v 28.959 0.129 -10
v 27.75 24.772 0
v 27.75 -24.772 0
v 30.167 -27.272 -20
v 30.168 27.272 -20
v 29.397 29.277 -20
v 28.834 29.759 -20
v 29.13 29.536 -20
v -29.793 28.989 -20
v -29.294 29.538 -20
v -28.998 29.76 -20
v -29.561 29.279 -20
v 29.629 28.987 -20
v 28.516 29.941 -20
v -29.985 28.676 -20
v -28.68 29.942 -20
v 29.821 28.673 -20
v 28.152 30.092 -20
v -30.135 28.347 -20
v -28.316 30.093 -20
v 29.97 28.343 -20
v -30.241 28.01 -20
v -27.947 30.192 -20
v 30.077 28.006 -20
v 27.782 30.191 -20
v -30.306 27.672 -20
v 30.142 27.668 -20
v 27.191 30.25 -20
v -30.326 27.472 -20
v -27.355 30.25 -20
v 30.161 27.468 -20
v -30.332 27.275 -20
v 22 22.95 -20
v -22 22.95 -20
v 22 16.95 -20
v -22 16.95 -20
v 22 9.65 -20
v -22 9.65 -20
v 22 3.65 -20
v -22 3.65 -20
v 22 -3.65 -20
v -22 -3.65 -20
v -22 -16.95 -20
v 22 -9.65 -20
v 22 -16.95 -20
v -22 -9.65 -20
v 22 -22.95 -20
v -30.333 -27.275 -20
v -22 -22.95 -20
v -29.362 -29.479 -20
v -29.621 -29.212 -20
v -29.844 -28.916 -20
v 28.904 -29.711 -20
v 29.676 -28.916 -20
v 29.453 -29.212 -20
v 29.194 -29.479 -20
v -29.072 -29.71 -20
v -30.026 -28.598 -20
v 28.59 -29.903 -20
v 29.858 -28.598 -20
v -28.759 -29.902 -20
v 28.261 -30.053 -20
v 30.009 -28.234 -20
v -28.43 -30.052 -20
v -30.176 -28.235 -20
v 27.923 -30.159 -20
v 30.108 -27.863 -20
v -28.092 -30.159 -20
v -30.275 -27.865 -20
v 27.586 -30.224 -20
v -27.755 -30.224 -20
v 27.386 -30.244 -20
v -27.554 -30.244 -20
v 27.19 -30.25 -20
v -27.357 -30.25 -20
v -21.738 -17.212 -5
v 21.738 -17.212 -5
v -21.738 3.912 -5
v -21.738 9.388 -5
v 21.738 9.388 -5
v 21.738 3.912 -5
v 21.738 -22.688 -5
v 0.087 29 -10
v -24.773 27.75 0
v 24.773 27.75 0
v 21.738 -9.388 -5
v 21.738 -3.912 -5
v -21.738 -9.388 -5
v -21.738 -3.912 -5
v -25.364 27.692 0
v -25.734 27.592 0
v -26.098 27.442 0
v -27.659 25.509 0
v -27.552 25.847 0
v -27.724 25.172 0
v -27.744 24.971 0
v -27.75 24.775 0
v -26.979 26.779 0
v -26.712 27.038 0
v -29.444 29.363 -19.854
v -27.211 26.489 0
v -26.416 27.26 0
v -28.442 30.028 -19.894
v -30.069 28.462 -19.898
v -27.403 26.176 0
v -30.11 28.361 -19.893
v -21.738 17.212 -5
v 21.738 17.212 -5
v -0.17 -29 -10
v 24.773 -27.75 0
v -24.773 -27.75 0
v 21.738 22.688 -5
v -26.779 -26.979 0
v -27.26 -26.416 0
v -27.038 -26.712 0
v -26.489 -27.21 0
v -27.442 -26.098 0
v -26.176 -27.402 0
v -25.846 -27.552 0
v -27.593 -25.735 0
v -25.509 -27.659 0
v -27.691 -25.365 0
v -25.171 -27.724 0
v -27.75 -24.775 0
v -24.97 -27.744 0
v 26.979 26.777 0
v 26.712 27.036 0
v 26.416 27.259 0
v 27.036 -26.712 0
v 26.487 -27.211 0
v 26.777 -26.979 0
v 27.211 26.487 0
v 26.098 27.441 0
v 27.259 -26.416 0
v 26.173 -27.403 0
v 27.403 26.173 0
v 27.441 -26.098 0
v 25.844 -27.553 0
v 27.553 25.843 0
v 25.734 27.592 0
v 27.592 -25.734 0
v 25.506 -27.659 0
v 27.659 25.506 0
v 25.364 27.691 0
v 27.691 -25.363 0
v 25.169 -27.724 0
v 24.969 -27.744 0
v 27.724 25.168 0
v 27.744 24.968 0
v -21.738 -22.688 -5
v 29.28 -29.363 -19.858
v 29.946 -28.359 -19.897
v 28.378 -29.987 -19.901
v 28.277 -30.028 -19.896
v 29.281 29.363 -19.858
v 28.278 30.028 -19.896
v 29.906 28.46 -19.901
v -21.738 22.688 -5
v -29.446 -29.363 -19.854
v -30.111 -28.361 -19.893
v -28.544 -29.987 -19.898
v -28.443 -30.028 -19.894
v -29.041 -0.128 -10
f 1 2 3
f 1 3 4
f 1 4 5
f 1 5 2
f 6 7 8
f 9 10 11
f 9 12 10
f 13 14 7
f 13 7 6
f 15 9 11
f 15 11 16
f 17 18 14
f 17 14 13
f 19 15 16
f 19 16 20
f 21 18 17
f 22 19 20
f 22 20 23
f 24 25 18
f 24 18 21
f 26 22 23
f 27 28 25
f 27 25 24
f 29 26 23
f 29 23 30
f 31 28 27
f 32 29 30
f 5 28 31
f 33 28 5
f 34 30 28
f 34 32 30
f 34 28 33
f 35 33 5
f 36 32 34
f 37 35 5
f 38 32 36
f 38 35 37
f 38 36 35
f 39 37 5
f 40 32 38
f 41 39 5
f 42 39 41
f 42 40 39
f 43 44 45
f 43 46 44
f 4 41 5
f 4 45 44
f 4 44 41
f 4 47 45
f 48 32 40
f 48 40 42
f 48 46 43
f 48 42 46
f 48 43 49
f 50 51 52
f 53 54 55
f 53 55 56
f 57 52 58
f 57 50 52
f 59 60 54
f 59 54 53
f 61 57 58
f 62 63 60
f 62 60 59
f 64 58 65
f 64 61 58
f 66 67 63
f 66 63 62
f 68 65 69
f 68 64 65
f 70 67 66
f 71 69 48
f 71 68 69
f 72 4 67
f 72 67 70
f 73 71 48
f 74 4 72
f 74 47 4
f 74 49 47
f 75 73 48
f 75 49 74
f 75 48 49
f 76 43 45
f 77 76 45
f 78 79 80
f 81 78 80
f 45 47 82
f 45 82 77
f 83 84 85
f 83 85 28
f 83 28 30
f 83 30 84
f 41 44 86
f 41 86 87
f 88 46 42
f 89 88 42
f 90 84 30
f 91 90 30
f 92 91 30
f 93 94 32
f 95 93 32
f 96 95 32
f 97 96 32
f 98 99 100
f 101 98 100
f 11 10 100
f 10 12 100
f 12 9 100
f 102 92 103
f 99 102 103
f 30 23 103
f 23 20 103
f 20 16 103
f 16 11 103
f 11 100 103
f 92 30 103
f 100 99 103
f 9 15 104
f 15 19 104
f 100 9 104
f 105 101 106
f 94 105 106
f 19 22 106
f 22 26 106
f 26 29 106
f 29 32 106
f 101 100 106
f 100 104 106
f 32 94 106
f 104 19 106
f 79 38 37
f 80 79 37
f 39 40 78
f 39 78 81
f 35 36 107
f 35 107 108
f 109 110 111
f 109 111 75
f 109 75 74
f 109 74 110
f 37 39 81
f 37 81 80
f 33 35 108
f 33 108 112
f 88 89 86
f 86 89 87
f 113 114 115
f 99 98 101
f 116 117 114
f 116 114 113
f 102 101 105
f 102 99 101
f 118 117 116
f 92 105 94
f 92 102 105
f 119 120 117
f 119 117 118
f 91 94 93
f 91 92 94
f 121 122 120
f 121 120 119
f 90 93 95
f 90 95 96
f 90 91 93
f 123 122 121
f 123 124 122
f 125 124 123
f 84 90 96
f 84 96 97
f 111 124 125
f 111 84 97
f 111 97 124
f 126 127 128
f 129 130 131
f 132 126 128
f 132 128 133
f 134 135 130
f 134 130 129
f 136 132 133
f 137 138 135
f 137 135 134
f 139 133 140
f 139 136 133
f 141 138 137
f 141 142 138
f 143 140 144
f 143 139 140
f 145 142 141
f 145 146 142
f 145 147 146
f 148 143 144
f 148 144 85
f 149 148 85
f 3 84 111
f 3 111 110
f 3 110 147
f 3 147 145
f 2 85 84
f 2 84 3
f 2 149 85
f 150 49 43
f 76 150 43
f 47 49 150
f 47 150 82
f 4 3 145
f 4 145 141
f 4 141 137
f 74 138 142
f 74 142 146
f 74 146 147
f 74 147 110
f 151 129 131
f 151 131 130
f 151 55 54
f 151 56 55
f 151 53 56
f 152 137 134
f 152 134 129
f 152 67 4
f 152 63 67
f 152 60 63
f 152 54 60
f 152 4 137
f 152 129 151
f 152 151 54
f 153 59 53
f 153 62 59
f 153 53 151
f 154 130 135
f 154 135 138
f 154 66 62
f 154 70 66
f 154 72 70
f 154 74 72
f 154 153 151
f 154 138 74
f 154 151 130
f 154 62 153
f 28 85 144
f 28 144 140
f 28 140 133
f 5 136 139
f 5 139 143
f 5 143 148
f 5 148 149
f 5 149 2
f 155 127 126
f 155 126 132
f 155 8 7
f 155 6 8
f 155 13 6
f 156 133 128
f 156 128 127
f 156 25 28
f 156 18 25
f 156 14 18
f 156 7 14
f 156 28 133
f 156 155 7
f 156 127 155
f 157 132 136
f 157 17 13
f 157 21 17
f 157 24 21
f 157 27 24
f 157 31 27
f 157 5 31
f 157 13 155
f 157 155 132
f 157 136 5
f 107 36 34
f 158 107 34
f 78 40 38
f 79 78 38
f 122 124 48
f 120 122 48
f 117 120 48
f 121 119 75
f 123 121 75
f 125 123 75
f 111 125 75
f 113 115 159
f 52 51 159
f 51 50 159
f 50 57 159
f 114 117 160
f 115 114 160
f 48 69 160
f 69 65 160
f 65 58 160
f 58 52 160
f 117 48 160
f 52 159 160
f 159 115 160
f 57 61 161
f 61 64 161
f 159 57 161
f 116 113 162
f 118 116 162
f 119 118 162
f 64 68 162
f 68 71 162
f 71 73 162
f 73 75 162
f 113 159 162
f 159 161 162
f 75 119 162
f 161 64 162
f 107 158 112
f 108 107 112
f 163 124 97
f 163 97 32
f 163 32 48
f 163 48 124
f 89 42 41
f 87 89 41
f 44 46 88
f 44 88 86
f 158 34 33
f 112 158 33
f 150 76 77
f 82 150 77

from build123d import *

# Parameters (mm, degrees)
ESQUISSE3_W                       = 44
ESQUISSE3_H                       = 6
ENL_V_MAT_EXTRU_3_DEPTH           = 15
ENL_V_MAT_EXTRU_3_DRAFT           = 1
ENL_V_MAT_EXTRU_3_PROFILE_2_DEPTH = 15
ENL_V_MAT_EXTRU_3_PROFILE_2_DRAFT = 1
ENL_V_MAT_EXTRU_3_PROFILE_3_DEPTH = 15
ENL_V_MAT_EXTRU_3_PROFILE_3_DRAFT = 1
ENL_V_MAT_EXTRU_3_PROFILE_4_DEPTH = 15
ENL_V_MAT_EXTRU_3_PROFILE_4_DRAFT = 1
CONG_1_R                          = 3


with BuildPart() as part:
    # Esquisse1 → Lissage1 section 0
    with BuildSketch(Plane.XY):
        with BuildLine():
            Line((-27.75, 27.75), (27.75, 27.75))
            Line((27.75, 27.75), (27.75, -27.75))
            Line((27.75, -27.75), (-27.75, -27.75))
            Line((-27.75, -27.75), (-27.75, 27.75))
        make_face()
    # Esquisse2 → Lissage1 section 1
    with BuildSketch(Plane.XY.offset(-20)):
        with BuildLine():
            Line((-30.33229437, 30.25), (30.16770563, 30.249999987))
            Line((30.16770563, 30.249999987), (30.166474554, -30.25))
            Line((30.166474554, -30.25), (-30.333525446, -30.25))
            Line((-30.333525446, -30.25), (-30.33229437, 30.25))
        make_face()
    loft()


with BuildPart() as enl_v_mat_extru_3_tool:
    # Esquisse3 → Enlèv. mat.-Extru.3 (with draft: the straight prism first)
    with BuildSketch(Plane.XY.offset(-20)):
        with Locations((0, -6.65)):
            Rectangle(ESQUISSE3_W, ESQUISSE3_H)
    extrude(amount=ENL_V_MAT_EXTRU_3_DEPTH)
    # Enlèv. mat.-Extru.3: the draft: its side faces are tilted about the plane it starts from
    enl_v_mat_extru_3_sides = [enl_v_mat_extru_3_tool.faces().sort_by_distance(p)[0] for p in [
        (0, -9.65, -12.5),
        (22, -6.65, -12.5),
        (0, -3.65, -12.5),
        (-22, -6.65, -12.5),
    ]]
    draft(enl_v_mat_extru_3_sides, Plane.XY.offset(-20), ENL_V_MAT_EXTRU_3_DRAFT)


with BuildPart() as part_1:
    add(part.part)

    # Enlèv. mat.-Extru.3: cut by enl_v_mat_extru_3_tool
    add(enl_v_mat_extru_3_tool.part, mode=Mode.SUBTRACT)


with BuildPart() as enl_v_mat_extru_3_profile_2_tool:
    # Esquisse3 → Enlèv. mat.-Extru.3 profile 2 (with draft: the straight prism first)
    with BuildSketch(Plane.XY.offset(-20)):
        with Locations((0, -19.95)):
            Rectangle(ESQUISSE3_W, ESQUISSE3_H)
    extrude(amount=ENL_V_MAT_EXTRU_3_PROFILE_2_DEPTH)
    # Enlèv. mat.-Extru.3 profile 2: the draft: its side faces are tilted about the plane it starts from
    enl_v_mat_extru_3_profile_2_sides = [enl_v_mat_extru_3_profile_2_tool.faces().sort_by_distance(p)[0] for p in [
        (0, -22.95, -12.5),
        (22, -19.95, -12.5),
        (0, -16.95, -12.5),
        (-22, -19.95, -12.5),
    ]]
    draft(enl_v_mat_extru_3_profile_2_sides, Plane.XY.offset(-20), ENL_V_MAT_EXTRU_3_PROFILE_2_DRAFT)


with BuildPart() as part_2:
    add(part_1.part)

    # Enlèv. mat.-Extru.3 profile 2: cut by enl_v_mat_extru_3_profile_2_tool
    add(enl_v_mat_extru_3_profile_2_tool.part, mode=Mode.SUBTRACT)


with BuildPart() as enl_v_mat_extru_3_profile_3_tool:
    # Esquisse3 → Enlèv. mat.-Extru.3 profile 3 (with draft: the straight prism first)
    with BuildSketch(Plane.XY.offset(-20)):
        with Locations((0, 6.65)):
            Rectangle(ESQUISSE3_W, ESQUISSE3_H)
    extrude(amount=ENL_V_MAT_EXTRU_3_PROFILE_3_DEPTH)
    # Enlèv. mat.-Extru.3 profile 3: the draft: its side faces are tilted about the plane it starts from
    enl_v_mat_extru_3_profile_3_sides = [enl_v_mat_extru_3_profile_3_tool.faces().sort_by_distance(p)[0] for p in [
        (0, 3.65, -12.5),
        (22, 6.65, -12.5),
        (0, 9.65, -12.5),
        (-22, 6.65, -12.5),
    ]]
    draft(enl_v_mat_extru_3_profile_3_sides, Plane.XY.offset(-20), ENL_V_MAT_EXTRU_3_PROFILE_3_DRAFT)


with BuildPart() as part_3:
    add(part_2.part)

    # Enlèv. mat.-Extru.3 profile 3: cut by enl_v_mat_extru_3_profile_3_tool
    add(enl_v_mat_extru_3_profile_3_tool.part, mode=Mode.SUBTRACT)


with BuildPart() as enl_v_mat_extru_3_profile_4_tool:
    # Esquisse3 → Enlèv. mat.-Extru.3 profile 4 (with draft: the straight prism first)
    with BuildSketch(Plane.XY.offset(-20)):
        with Locations((0, 19.95)):
            Rectangle(ESQUISSE3_W, ESQUISSE3_H)
    extrude(amount=ENL_V_MAT_EXTRU_3_PROFILE_4_DEPTH)
    # Enlèv. mat.-Extru.3 profile 4: the draft: its side faces are tilted about the plane it starts from
    enl_v_mat_extru_3_profile_4_sides = [enl_v_mat_extru_3_profile_4_tool.faces().sort_by_distance(p)[0] for p in [
        (0, 16.95, -12.5),
        (22, 19.95, -12.5),
        (0, 22.95, -12.5),
        (-22, 19.95, -12.5),
    ]]
    draft(enl_v_mat_extru_3_profile_4_sides, Plane.XY.offset(-20), ENL_V_MAT_EXTRU_3_PROFILE_4_DRAFT)


with BuildPart() as part_4:
    add(part_3.part)

    # Enlèv. mat.-Extru.3 profile 4: cut by enl_v_mat_extru_3_profile_4_tool
    add(enl_v_mat_extru_3_profile_4_tool.part, mode=Mode.SUBTRACT)

    # Congé1
    cong_1_edges = [part_4.edges().sort_by_distance(p)[0] for p in [
        (-29.041147185, 29, -10),
        (-29.041762723, -29, -10),
        (28.958852815, 28.999999994, -10),
        (28.958237277, -29, -10),
    ]]
    fillet(cong_1_edges, radius=CONG_1_R)


solid = part_4.part
